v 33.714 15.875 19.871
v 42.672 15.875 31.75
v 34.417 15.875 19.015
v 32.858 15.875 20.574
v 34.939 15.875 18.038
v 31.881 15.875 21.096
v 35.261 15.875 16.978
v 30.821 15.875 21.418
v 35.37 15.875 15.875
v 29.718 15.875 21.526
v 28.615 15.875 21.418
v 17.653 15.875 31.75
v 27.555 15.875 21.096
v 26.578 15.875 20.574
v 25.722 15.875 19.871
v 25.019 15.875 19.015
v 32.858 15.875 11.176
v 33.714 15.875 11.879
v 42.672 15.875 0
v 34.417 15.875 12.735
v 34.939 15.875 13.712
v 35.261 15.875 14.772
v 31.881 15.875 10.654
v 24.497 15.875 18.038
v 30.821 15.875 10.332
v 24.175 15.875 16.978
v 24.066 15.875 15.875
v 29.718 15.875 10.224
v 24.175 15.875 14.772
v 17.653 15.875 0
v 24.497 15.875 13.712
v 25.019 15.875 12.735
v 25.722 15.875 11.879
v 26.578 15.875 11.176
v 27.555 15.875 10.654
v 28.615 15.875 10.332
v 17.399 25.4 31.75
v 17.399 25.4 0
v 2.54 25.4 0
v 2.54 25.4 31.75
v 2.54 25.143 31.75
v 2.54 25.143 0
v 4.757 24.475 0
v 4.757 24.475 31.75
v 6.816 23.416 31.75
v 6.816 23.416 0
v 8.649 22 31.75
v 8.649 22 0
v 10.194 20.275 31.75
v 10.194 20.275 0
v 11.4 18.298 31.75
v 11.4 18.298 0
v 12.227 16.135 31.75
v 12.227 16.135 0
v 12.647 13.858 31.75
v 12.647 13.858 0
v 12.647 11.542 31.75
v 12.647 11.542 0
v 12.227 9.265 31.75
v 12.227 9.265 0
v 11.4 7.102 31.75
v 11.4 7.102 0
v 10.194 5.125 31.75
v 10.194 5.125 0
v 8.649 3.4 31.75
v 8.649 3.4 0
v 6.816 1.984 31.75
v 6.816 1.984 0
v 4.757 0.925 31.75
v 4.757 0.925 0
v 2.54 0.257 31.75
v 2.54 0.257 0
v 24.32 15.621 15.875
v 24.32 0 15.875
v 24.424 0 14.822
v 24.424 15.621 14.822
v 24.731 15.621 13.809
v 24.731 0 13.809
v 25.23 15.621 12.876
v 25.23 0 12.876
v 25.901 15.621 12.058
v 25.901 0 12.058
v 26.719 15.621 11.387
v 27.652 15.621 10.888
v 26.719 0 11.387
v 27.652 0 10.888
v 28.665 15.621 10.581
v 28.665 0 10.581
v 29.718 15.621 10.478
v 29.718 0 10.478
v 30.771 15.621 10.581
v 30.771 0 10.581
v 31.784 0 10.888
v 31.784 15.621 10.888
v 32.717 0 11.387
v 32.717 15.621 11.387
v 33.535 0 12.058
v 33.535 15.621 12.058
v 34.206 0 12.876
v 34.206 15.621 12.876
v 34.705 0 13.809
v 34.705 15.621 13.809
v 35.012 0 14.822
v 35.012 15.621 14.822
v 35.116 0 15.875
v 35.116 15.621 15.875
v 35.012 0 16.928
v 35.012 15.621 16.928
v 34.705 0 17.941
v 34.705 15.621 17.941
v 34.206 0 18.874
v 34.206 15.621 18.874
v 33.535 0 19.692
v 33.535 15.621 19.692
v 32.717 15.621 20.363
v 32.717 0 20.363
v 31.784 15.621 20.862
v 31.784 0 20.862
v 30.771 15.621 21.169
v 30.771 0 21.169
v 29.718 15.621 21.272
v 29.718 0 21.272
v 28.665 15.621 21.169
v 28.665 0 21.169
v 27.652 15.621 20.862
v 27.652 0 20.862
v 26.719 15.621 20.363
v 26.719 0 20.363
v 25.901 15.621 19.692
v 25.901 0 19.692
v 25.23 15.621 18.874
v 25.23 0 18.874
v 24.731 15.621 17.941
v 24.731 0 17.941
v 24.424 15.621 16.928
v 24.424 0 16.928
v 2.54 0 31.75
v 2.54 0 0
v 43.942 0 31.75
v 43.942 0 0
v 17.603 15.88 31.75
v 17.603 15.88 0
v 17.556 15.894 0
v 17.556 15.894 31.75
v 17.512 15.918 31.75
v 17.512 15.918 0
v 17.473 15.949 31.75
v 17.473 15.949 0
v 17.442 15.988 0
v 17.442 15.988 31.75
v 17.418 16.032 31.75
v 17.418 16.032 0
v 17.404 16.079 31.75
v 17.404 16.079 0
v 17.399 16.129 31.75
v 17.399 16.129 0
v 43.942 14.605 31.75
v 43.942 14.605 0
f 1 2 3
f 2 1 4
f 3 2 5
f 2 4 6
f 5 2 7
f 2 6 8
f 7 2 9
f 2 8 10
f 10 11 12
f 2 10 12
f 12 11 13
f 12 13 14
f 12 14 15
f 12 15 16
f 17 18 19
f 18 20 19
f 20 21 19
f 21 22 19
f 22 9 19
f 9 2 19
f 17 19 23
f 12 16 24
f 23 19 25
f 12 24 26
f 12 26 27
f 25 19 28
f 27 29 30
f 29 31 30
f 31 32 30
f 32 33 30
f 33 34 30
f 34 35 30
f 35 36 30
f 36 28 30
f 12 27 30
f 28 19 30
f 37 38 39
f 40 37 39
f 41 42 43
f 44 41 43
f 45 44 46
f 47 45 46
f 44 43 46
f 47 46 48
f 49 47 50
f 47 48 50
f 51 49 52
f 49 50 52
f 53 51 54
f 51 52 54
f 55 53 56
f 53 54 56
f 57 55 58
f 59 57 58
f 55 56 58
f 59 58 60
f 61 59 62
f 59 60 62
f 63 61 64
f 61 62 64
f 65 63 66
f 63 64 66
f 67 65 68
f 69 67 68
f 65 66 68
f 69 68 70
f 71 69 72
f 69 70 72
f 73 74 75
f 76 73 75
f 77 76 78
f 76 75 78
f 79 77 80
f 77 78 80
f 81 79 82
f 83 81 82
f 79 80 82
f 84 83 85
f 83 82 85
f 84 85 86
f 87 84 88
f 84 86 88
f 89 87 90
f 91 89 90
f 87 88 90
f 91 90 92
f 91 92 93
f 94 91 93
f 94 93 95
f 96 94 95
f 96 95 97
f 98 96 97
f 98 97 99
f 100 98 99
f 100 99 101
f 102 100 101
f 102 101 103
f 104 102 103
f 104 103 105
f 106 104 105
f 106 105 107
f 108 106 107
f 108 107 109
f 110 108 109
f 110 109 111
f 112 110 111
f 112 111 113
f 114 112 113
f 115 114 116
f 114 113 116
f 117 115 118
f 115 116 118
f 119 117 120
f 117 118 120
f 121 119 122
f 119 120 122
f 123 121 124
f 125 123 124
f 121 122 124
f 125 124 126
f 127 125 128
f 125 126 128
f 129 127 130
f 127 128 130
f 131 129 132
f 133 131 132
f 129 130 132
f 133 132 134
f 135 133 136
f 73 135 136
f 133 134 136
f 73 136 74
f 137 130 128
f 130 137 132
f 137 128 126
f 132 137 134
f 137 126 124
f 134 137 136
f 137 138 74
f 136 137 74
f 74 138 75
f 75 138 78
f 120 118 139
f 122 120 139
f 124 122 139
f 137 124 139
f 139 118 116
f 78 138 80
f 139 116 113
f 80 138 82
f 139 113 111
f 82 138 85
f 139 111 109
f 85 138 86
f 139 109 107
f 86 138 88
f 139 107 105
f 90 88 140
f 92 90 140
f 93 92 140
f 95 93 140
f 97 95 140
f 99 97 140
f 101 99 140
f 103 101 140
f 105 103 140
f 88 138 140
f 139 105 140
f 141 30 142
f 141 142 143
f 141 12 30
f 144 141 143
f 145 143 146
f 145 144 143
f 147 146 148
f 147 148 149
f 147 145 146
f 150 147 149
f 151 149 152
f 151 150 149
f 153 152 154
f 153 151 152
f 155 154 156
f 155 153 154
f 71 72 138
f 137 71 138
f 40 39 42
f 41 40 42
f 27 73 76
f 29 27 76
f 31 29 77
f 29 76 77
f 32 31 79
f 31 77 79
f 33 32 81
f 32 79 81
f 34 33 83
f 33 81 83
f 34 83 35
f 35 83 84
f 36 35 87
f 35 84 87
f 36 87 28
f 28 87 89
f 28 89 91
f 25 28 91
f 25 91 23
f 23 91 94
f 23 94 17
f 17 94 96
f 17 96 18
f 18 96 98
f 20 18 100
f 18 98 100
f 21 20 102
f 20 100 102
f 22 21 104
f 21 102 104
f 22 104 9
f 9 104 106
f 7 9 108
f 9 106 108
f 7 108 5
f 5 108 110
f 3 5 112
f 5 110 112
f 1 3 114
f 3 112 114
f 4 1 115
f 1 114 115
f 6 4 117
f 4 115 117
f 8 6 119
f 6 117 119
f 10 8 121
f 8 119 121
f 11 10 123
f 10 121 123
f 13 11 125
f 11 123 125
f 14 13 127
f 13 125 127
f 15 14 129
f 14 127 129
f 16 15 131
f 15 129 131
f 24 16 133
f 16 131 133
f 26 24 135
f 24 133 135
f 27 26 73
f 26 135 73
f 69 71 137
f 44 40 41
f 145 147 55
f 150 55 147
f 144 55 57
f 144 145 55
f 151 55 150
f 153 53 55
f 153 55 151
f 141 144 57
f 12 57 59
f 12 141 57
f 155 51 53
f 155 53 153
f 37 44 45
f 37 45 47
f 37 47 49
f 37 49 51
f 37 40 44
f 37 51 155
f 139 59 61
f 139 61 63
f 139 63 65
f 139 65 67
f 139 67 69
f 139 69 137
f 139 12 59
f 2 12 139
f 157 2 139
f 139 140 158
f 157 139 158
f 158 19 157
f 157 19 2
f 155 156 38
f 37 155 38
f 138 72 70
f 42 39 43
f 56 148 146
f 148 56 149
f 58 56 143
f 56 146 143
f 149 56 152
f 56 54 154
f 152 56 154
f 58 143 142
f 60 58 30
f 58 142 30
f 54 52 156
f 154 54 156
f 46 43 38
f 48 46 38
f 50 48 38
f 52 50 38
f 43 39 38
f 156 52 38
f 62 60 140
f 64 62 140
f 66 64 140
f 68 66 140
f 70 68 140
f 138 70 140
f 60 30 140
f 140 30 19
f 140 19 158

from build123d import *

# Parameters (mm, degrees)
BOSS_EXTRUDE1_DEPTH      = 31.75
X_0_397_DIAMETER_HOLE1_D = 10.795
CHAMFER1_SIZE            = 1.27
CHAMFER2_SIZE            = 0.254
FILLET1_R                = 0.254


with BuildPart() as part:
    # Sketch1 → Boss-Extrude1 (new body)
    with BuildSketch(Plane.XY):
        with BuildLine():
            Line((2.54, 0), (43.942, 0))
            Line((43.942, 0), (43.942, 15.875))
            Line((43.942, 15.875), (17.399, 15.875))
            Line((17.399, 15.875), (17.399, 25.4))
            Line((17.399, 25.4), (2.54, 25.4))
            Line((2.54, 25.4), (2.54, 25.143407893))
            ThreePointArc((2.54, 25.143407893), (12.7, 12.7), (2.54, 0.256592107))
            Line((2.54, 0.256592107), (2.54, 0))
        make_face()
    extrude(amount=BOSS_EXTRUDE1_DEPTH)

    # X (0.397) Diameter Hole1 (through all)
    with Locations(Plane(origin=(0, 15.875, 0), x_dir=(1, 0, 0), z_dir=(0, 1, 0))):
        with Locations((29.718, -15.875)):
            Hole(X_0_397_DIAMETER_HOLE1_D / 2)

    # Chamfer1
    chamfer1_edges = [part.edges().sort_by_distance(p)[0] for p in [
        (43.942, 15.875, 15.875),
    ]]
    chamfer(chamfer1_edges, length=CHAMFER1_SIZE)

    # Chamfer2
    chamfer2_edges = [part.edges().sort_by_distance(p)[0] for p in [
        (35.1155, 15.875, 15.875),
    ]]
    chamfer(chamfer2_edges, length=CHAMFER2_SIZE)

    # Fillet1
    fillet1_edges = [part.edges().sort_by_distance(p)[0] for p in [
        (17.399, 15.875, 15.875),
    ]]
    fillet(fillet1_edges, radius=FILLET1_R)


solid = part.part
